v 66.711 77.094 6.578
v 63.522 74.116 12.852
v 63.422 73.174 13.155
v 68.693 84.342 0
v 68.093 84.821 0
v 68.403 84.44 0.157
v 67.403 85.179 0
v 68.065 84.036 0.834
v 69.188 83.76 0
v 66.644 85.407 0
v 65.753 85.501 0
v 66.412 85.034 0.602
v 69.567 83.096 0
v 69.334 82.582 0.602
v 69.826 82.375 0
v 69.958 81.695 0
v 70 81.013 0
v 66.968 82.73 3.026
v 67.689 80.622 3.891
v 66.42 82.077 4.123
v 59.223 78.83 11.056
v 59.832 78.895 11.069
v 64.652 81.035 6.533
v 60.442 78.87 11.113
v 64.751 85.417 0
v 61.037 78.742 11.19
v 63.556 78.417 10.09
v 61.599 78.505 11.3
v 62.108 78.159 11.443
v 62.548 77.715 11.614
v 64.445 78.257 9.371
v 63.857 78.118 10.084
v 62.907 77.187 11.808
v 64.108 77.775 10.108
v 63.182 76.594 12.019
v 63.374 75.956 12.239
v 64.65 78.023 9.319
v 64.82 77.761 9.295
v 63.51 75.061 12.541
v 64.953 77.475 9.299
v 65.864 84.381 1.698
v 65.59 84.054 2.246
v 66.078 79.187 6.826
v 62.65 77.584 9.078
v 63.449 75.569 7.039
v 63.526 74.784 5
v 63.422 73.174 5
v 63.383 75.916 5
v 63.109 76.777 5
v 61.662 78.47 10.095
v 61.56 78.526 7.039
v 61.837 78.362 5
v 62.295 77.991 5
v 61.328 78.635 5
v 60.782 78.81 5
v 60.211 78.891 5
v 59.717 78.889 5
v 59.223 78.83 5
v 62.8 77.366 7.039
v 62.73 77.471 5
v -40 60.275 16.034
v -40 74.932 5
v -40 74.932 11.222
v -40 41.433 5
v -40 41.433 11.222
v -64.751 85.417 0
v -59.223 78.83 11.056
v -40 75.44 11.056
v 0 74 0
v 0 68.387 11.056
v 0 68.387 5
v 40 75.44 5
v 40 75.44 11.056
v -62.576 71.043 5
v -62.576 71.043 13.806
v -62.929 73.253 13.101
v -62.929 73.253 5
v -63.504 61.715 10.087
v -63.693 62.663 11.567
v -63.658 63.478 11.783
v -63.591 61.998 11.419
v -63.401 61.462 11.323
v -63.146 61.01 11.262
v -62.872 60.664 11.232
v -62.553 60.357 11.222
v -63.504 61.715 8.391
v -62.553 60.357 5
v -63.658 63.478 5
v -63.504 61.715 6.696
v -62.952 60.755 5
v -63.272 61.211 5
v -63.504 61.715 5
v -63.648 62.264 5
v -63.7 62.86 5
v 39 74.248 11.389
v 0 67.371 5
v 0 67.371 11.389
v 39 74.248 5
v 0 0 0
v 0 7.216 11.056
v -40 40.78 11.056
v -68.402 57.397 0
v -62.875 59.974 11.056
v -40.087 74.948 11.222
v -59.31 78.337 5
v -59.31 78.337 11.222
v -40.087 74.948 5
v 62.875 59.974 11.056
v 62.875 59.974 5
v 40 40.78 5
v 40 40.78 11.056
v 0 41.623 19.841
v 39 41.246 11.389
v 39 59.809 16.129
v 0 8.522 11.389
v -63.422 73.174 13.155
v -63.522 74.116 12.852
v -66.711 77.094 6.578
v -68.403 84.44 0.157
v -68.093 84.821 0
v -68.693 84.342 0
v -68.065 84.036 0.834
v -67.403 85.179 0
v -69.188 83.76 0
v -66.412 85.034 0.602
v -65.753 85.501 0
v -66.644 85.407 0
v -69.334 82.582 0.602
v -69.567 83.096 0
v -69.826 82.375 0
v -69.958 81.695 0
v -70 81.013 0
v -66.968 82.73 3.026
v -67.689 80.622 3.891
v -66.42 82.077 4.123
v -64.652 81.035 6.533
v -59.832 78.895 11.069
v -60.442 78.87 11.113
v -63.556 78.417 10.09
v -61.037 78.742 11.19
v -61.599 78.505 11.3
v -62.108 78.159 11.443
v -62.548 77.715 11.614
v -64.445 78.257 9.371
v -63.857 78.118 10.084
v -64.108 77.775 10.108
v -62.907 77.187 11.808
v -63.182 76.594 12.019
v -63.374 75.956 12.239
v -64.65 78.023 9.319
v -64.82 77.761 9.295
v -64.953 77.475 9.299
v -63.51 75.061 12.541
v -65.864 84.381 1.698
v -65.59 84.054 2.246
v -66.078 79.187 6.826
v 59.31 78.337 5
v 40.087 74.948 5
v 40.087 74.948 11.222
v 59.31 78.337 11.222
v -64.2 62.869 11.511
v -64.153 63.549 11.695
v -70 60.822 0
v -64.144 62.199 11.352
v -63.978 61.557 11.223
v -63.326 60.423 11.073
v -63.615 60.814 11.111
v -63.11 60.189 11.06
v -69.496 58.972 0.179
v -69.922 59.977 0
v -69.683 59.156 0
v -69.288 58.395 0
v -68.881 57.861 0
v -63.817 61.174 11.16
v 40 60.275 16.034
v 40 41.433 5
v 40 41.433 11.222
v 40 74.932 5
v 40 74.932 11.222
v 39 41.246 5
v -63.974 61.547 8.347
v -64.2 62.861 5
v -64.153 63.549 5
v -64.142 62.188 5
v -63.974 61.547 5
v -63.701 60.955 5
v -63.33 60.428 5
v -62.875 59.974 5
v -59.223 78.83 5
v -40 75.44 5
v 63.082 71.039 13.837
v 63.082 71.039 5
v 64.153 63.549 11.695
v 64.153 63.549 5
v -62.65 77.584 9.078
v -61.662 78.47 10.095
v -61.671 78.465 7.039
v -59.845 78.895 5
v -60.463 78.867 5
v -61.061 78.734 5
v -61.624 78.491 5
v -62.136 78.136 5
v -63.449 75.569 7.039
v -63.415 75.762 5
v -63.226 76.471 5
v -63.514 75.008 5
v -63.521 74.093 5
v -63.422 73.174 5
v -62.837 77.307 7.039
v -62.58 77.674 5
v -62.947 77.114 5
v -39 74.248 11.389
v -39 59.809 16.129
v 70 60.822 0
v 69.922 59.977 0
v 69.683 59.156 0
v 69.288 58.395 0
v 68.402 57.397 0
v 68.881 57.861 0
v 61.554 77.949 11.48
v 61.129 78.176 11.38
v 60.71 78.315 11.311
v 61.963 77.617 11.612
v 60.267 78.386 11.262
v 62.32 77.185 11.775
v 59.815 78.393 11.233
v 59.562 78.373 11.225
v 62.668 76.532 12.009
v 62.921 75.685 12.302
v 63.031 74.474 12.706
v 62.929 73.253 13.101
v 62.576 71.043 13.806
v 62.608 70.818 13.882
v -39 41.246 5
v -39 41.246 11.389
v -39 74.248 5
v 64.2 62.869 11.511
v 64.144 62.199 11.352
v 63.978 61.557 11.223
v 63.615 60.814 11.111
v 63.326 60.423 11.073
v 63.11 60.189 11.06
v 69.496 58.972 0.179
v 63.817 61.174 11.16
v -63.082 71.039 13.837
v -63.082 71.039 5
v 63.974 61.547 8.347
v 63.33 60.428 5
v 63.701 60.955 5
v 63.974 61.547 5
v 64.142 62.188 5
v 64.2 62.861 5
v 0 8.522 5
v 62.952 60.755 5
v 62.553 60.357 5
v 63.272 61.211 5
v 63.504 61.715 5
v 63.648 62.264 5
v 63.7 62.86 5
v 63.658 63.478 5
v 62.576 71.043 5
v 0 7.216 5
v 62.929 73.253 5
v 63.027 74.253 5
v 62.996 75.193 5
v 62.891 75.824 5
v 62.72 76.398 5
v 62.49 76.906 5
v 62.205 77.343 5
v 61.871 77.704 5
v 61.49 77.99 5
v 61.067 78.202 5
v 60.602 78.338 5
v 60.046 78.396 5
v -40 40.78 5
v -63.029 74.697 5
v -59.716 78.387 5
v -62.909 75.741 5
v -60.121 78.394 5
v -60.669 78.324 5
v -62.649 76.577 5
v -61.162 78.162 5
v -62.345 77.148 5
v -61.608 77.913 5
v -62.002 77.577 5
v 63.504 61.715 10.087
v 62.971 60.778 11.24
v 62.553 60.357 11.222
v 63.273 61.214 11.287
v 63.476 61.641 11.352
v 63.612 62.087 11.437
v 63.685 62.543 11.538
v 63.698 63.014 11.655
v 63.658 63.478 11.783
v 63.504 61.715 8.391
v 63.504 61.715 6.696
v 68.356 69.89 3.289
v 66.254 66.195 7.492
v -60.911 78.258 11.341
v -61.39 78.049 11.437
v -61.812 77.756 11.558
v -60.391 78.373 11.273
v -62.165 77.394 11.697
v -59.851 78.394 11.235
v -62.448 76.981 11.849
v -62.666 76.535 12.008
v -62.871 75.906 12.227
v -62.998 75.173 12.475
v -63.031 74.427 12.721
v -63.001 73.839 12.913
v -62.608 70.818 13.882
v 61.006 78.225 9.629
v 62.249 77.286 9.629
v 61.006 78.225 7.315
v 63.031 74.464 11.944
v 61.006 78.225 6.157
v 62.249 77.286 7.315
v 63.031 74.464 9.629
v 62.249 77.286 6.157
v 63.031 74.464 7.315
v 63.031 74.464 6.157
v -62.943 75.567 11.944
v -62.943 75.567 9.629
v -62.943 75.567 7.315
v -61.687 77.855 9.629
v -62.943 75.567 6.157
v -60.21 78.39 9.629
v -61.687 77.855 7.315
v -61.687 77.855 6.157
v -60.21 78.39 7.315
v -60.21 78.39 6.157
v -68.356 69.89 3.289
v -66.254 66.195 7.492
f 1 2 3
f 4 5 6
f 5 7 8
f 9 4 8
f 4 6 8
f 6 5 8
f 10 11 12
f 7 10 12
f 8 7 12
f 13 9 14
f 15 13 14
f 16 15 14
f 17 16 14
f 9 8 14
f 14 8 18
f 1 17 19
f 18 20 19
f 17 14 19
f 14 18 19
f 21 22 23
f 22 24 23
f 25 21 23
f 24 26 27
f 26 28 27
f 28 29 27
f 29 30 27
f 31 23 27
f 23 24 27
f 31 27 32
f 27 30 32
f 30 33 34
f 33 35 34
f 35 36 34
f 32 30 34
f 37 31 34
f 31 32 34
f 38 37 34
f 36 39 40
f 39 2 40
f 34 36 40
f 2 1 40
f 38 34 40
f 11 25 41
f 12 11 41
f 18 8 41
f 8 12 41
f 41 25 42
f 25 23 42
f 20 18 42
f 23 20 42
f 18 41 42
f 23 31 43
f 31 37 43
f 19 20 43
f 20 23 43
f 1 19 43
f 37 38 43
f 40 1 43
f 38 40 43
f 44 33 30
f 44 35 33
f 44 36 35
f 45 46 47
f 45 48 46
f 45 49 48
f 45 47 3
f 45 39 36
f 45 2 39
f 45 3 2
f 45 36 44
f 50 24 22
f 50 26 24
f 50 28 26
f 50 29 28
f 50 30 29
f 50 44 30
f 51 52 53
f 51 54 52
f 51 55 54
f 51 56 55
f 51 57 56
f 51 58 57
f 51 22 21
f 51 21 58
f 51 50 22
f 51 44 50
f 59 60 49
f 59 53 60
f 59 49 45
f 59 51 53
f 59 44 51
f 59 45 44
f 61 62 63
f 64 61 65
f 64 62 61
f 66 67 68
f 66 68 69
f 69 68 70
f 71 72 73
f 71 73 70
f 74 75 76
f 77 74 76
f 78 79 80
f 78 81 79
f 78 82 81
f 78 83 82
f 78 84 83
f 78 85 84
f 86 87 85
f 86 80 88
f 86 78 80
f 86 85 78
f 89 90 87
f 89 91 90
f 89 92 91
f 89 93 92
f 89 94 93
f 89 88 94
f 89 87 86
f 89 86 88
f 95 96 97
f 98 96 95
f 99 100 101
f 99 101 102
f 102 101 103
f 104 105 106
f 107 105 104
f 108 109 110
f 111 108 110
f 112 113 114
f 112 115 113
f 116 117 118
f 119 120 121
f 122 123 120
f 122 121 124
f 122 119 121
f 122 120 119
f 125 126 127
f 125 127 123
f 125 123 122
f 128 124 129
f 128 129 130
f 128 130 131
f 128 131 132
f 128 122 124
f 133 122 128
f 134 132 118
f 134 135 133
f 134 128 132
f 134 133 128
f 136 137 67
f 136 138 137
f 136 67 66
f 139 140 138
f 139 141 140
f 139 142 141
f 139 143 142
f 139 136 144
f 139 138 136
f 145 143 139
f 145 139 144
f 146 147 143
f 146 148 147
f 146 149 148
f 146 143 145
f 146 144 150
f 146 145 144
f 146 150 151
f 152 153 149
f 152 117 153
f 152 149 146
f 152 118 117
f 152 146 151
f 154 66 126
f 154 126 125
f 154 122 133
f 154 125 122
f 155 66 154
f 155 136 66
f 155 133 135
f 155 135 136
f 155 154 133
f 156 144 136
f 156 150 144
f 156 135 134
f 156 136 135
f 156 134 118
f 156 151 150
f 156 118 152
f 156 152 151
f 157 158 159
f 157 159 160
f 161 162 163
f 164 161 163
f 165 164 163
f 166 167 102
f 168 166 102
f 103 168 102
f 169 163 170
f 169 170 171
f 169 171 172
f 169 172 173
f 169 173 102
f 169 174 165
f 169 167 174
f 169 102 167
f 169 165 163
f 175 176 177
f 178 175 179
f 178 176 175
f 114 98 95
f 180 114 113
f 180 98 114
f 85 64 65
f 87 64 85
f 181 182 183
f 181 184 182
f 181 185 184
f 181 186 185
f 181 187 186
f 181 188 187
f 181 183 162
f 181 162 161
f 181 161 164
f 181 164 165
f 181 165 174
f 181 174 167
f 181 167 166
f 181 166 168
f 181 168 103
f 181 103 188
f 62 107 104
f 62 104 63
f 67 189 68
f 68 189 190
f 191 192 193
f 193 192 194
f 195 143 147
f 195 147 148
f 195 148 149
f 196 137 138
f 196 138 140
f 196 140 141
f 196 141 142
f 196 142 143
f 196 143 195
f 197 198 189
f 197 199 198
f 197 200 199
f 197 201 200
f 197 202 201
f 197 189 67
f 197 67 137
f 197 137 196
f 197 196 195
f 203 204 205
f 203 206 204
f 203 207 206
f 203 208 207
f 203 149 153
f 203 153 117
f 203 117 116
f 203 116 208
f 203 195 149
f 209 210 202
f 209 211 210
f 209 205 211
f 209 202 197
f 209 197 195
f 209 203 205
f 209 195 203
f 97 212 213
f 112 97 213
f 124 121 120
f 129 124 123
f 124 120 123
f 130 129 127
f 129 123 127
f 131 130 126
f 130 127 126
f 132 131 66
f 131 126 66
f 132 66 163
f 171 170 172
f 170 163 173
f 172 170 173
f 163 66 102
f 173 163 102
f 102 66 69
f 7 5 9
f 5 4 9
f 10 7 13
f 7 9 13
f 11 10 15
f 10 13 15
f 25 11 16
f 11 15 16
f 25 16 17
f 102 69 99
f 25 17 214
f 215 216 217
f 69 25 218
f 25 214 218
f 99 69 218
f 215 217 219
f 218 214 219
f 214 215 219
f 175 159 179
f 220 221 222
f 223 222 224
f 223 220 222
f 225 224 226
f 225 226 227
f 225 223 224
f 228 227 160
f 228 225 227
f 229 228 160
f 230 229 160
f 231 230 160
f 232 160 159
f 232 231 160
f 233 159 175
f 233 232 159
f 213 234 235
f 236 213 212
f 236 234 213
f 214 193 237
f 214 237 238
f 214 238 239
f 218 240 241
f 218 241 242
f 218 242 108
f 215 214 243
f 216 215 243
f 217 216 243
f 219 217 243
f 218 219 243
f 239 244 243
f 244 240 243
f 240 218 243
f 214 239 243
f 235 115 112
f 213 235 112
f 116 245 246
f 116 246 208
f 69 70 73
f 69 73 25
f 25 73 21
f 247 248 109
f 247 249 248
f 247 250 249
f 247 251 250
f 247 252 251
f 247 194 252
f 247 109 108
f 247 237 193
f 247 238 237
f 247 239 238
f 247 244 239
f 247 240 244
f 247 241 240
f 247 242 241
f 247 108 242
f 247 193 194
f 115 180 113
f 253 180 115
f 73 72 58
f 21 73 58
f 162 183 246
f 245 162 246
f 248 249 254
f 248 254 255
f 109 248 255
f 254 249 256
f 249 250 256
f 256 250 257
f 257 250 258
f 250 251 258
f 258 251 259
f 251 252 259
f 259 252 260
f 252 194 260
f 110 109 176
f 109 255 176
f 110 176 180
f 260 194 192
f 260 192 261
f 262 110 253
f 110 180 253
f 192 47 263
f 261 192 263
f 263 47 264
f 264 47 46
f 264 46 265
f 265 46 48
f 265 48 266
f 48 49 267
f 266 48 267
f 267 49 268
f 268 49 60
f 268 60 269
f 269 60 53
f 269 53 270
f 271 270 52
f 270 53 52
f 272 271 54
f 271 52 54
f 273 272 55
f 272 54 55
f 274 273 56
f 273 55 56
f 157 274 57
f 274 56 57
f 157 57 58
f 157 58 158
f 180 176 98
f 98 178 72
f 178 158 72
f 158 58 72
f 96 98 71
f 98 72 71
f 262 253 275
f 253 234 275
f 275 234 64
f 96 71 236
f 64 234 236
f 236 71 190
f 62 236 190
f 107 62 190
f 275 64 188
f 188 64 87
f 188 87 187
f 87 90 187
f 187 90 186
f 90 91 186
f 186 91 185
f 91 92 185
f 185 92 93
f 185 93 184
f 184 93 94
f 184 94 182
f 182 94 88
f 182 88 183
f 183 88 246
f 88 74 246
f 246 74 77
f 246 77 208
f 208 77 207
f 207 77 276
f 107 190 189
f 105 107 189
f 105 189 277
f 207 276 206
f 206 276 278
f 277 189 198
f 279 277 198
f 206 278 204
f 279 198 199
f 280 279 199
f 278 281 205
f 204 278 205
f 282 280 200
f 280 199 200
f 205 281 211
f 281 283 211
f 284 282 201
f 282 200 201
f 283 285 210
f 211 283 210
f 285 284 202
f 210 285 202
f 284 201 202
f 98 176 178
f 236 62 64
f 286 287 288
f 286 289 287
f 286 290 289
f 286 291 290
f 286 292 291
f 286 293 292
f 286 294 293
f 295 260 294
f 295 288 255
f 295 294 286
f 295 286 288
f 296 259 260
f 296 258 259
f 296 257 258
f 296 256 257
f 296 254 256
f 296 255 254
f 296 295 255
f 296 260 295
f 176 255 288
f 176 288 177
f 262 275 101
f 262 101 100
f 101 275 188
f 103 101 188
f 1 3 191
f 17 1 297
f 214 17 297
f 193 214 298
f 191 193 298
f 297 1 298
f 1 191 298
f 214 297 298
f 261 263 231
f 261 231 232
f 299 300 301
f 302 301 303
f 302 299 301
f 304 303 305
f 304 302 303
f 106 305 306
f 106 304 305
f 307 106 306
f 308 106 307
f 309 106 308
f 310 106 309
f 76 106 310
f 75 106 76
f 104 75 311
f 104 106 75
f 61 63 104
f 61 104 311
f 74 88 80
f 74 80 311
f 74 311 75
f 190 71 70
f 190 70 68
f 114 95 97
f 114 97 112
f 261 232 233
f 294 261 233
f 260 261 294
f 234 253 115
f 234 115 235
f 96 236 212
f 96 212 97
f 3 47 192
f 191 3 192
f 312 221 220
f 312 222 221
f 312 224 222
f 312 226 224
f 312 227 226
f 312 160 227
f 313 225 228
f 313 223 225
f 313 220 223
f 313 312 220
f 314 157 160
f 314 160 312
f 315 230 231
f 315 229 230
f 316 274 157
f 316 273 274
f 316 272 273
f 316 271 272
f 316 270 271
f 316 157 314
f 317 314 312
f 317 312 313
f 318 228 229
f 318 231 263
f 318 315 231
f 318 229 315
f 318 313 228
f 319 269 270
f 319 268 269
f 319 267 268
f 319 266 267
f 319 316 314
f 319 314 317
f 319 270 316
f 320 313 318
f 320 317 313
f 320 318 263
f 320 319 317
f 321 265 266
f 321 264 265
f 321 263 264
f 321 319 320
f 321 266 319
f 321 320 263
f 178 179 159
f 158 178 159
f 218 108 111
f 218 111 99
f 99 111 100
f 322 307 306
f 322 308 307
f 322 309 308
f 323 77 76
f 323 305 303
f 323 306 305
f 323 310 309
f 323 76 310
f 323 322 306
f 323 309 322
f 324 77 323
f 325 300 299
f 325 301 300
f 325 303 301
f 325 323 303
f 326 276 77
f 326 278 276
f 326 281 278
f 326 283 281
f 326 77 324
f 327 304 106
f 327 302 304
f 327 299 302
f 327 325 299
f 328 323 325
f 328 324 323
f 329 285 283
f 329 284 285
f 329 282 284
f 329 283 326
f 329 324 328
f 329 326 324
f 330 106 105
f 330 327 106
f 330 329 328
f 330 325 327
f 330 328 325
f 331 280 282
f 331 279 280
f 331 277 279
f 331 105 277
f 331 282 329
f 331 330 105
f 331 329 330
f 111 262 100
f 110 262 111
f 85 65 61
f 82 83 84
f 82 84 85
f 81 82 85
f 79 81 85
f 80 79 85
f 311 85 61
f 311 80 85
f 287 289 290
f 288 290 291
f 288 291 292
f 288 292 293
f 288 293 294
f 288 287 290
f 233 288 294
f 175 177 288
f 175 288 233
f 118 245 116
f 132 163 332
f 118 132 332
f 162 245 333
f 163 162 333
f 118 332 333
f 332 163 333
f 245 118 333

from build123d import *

# Parameters (mm, degrees)
CHAMFER_1_SIZE      = 10
CHAMFER_1_SIZE_2    = 22.360679775
FILLET_3_R          = 5
CUT_EXTRUDE_START   = 5
CUT_EXTRUDE_2_DEPTH = 108.268120159
CUT_EXTRUDE_3_DEPTH = 108.268120141


with BuildPart() as part:
    # 草图1 → 放样1 section 0
    with BuildSketch(Plane.XY):
        with BuildLine():
            Line((0, 74), (70, 86.34288865))
            Line((70, 86.34288865), (70, 58.736974182))
            Line((70, 58.736974182), (0, 0))
            Line((0, 0), (-70, 58.736974182))
            Line((-70, 58.736974182), (-70, 86.34288865))
            Line((-70, 86.34288865), (0, 74))
        make_face()
    # 草图2 → 放样1 section 1
    with BuildSketch(Plane.XY.offset(20)):
        with BuildLine():
            Line((60, 74.425352724), (0, 63.845733881))
            Line((0, 63.845733881), (-60, 74.425352724))
            Line((-60, 74.425352724), (-60, 63.400050764))
            Line((-60, 63.400050764), (0, 13.054072893))
            Line((0, 13.054072893), (60, 63.400050764))
            Line((60, 63.400050764), (60, 74.425352724))
        make_face()
    loft()

    # 倒角1
    # the kernel refuses this chamfer: 22.360679775, 10 mm, written as the material it takes off along each edge
    with BuildSketch(Plane(origin=(57.145762753, 53.769394075, 20), x_dir=(0.07765782588644504, 0.44041941610082364, -0.8944271909999159), z_dir=(-0.9848077530122075, 0.17364817766693405, 0))) as chamfer_1_piece_1_section:
        Polygon((CHAMFER_1_SIZE, 0), (-CHAMFER_1_SIZE_2 * 0.4472135955, CHAMFER_1_SIZE_2 * 0.894427191), (0, 0), align=None)
    chamfer_1_piece_1 = extrude(amount=176.980253225, mode=Mode.PRIVATE)
    chamfer_1_piece_1 = split(chamfer_1_piece_1, bisect_by=Plane(origin=(57.189420764, 53.521797191, 19.245750606), z_dir=(-0.05491237529650921, 0.3114235556911101, 0.9486832980505147)), keep=Keep.TOP, mode=Mode.PRIVATE)
    add(chamfer_1_piece_1, mode=Mode.SUBTRACT)
    with BuildSketch(Plane(origin=(117.145762753, 84.50169253, 20), x_dir=(-0.0776578258864451, 0.4404194161008233, -0.8944271909999161), z_dir=(-0.9848077530122074, -0.1736481776669343, 0))) as chamfer_1_piece_2_section:
        Polygon((CHAMFER_1_SIZE, 0), (-CHAMFER_1_SIZE_2 * 0.4472135955, CHAMFER_1_SIZE_2 * 0.894427191), (0, 0), align=None)
    chamfer_1_piece_2 = extrude(amount=176.980253225, mode=Mode.PRIVATE)
    chamfer_1_piece_2 = split(chamfer_1_piece_2, bisect_by=Plane(origin=(116.05099823, 78.292974393, 1.086507133), z_dir=(0.054912375296509185, 0.31142355569111035, 0.9486832980505147)), keep=Keep.TOP, mode=Mode.PRIVATE)
    add(chamfer_1_piece_2, mode=Mode.SUBTRACT)
    with BuildSketch(Plane(origin=(-44.451512359, -24.245174733, 20), x_dir=(0.28746335807073986, -0.34258548972000163, -0.894427190999916), z_dir=(0.7660444431189795, 0.6427876096865376, 0)), Plane(origin=(-104.451512359, 100.69929839, 20), x_dir=(-0.28746335807074064, -0.3425854897200026, -0.8944271909999154), z_dir=(0.7660444431189795, -0.6427876096865376, 0))) as chamfer_1_piece_3:
        Polygon((CHAMFER_1_SIZE, 0), (-CHAMFER_1_SIZE_2 * 0.4472135955, CHAMFER_1_SIZE_2 * 0.894427191), (0, 0), align=None)
    extrude(amount=194.379093872, mode=Mode.SUBTRACT)

    # 圆角3
    fillet_3_edges = [part.edges().sort_by_distance(p)[0] for p in [
        (-67.236067978, 60.025816851, 5.527864045),
        (-67.236067978, 83.048962732, 5.527864045),
        (67.236067977, 60.025816851, 5.527864045),
        (67.236067977, 83.048962732, 5.527864045),
    ]]
    fillet(fillet_3_edges, radius=FILLET_3_R)

    # 草图7 → 切除-拉伸2 (cut, through all)
    with BuildSketch(Plane.XY.offset(CUT_EXTRUDE_START)):
        Polygon((-40, 75.43993897), (-40, 40.780099266), (0, 7.216114019), (40, 40.780099266), (40, 75.43993897), (0, 68.386859742), align=None)
        Polygon((-39, 74.248185378), (0, 67.37143313), (39, 74.248185378), (39, 41.246406924), (0, 8.521521308), (-39, 41.246406924), align=None, mode=Mode.SUBTRACT)
    extrude(amount=CUT_EXTRUDE_2_DEPTH, mode=Mode.SUBTRACT)

    # 草图9 → 切除-拉伸3 (cut, through all)
    with BuildSketch(Plane.XY.offset(CUT_EXTRUDE_START)):
        with BuildLine():
            Line((-40, 75.43993897), (0, 68.386859742))
            Line((0, 68.386859742), (40, 75.43993897))
            Line((40, 75.43993897), (59.223421741, 78.829546885))
            add(Edge.make_bspline(
                [(63.422393112, 73.174317919), (64.472135955, 79.755036815), (59.223421741, 78.829546885)],
                knots=[2.124820971, 2.124820971, 2.124820971, 3.634497794, 3.634497794, 3.634497794], degree=2, weights=[1, 0.728382268, 1]))
            Line((63.422393112, 73.174317919), (63.081692851, 71.038506602))
            Line((63.081692851, 71.038506602), (64.15263548, 63.549036282))
            add(Edge.make_bspline(
                [(62.874633581, 59.974195867), (64.472135955, 61.31465952), (64.15263548, 63.549036282)],
                knots=[2.89691376, 2.89691376, 2.89691376, 3.672186613, 3.672186613, 3.672186613], degree=2, weights=[1, 0.925805079, 1]))
            Line((62.874633581, 59.974195867), (40, 40.780099266))
            Line((40, 40.780099266), (0, 7.216114019))
            Line((0, 7.216114019), (-40, 40.780099266))
            Line((-40, 40.780099266), (-62.874633581, 59.974195867))
            add(Edge.make_bspline(
                [(-64.15263548, 63.549036282), (-64.472135955, 61.31465952), (-62.874633581, 59.974195867)],
                knots=[2.610998694, 2.610998694, 2.610998694, 3.386271547, 3.386271547, 3.386271547], degree=2, weights=[1, 0.925805079, 1]))
            Line((-64.15263548, 63.549036282), (-63.081692851, 71.038506602))
            Line((-63.081692851, 71.038506602), (-63.422393112, 73.174317919))
            add(Edge.make_bspline(
                [(-59.223421741, 78.829546885), (-64.472135955, 79.755036815), (-63.422393112, 73.174317919)],
                knots=[2.648687513, 2.648687513, 2.648687513, 4.158364336, 4.158364336, 4.158364336], degree=2, weights=[1, 0.728382268, 1]))
            Line((-59.223421741, 78.829546885), (-40, 75.43993897))
        make_face()
        with BuildLine():
            Line((-59.31024583, 78.337143008), (-40.086824089, 74.947535094))
            Line((-40.086824089, 74.947535094), (0, 67.879146436))
            Line((0, 67.879146436), (40.086824089, 74.947535094))
            Line((40.086824089, 74.947535094), (59.31024583, 78.337143008))
            add(Edge.make_bspline(
                [(59.31024583, 78.337143008), (59.606035397, 78.389298689), (60.236089665, 78.427658938), (61.023214098, 78.258065344), (61.707637648, 77.888235871), (62.45863279, 77.130661919), (62.942544445, 75.958588793), (63.064569227, 74.489707699), (62.992457265, 73.653171126), (62.92863572, 73.253081091)],
                knots=[2.124820971, 2.124820971, 2.124820971, 2.124820971, 2.313530574, 2.502240177, 2.69094978, 2.879659382, 3.257078588, 3.445788191, 3.634497794, 3.634497794, 3.634497794, 3.634497794], degree=3))
            Line((62.92863572, 73.253081091), (62.576022888, 71.04259122))
            Line((62.576022888, 71.04259122), (63.657670159, 63.478259653))
            add(Edge.make_bspline(
                [(63.657670159, 63.478259653), (63.701203567, 63.173815556), (63.721909403, 62.536225056), (63.535721886, 61.698867433), (63.156823887, 60.958692701), (62.768132959, 60.537534879), (62.553239776, 60.357218088)],
                knots=[2.89691376, 2.89691376, 2.89691376, 2.89691376, 3.090731973, 3.284550187, 3.4783684, 3.672186613, 3.672186613, 3.672186613, 3.672186613], degree=3))
            Line((62.553239776, 60.357218088), (39.678606195, 41.163121487))
            Line((39.678606195, 41.163121487), (0, 7.868817663))
            Line((0, 7.868817663), (-39.678606195, 41.163121487))
            Line((-39.678606195, 41.163121487), (-62.553239776, 60.357218088))
            add(Edge.make_bspline(
                [(-62.553239776, 60.357218088), (-62.768132959, 60.537534879), (-63.156823887, 60.958692701), (-63.535721886, 61.698867433), (-63.721909403, 62.536225056), (-63.701203567, 63.173815556), (-63.657670159, 63.478259653)],
                knots=[2.610998694, 2.610998694, 2.610998694, 2.610998694, 2.804816907, 2.998635121, 3.192453334, 3.386271547, 3.386271547, 3.386271547, 3.386271547], degree=3))
            Line((-63.657670159, 63.478259653), (-62.576022888, 71.04259122))
            Line((-62.576022888, 71.04259122), (-62.92863572, 73.253081091))
            add(Edge.make_bspline(
                [(-62.92863572, 73.253081091), (-62.992457265, 73.653171126), (-63.064569227, 74.489707699), (-62.942544445, 75.958588793), (-62.45863279, 77.130661919), (-61.707637648, 77.888235871), (-61.023214098, 78.258065344), (-60.236089665, 78.427658938), (-59.606035397, 78.389298689), (-59.31024583, 78.337143008)],
                knots=[2.648687513, 2.648687513, 2.648687513, 2.648687513, 2.837397116, 3.026106719, 3.403525925, 3.592235528, 3.78094513, 3.969654733, 4.158364336, 4.158364336, 4.158364336, 4.158364336], degree=3))
        make_face(mode=Mode.SUBTRACT)
    extrude(amount=CUT_EXTRUDE_3_DEPTH, mode=Mode.SUBTRACT)


solid = part.part
